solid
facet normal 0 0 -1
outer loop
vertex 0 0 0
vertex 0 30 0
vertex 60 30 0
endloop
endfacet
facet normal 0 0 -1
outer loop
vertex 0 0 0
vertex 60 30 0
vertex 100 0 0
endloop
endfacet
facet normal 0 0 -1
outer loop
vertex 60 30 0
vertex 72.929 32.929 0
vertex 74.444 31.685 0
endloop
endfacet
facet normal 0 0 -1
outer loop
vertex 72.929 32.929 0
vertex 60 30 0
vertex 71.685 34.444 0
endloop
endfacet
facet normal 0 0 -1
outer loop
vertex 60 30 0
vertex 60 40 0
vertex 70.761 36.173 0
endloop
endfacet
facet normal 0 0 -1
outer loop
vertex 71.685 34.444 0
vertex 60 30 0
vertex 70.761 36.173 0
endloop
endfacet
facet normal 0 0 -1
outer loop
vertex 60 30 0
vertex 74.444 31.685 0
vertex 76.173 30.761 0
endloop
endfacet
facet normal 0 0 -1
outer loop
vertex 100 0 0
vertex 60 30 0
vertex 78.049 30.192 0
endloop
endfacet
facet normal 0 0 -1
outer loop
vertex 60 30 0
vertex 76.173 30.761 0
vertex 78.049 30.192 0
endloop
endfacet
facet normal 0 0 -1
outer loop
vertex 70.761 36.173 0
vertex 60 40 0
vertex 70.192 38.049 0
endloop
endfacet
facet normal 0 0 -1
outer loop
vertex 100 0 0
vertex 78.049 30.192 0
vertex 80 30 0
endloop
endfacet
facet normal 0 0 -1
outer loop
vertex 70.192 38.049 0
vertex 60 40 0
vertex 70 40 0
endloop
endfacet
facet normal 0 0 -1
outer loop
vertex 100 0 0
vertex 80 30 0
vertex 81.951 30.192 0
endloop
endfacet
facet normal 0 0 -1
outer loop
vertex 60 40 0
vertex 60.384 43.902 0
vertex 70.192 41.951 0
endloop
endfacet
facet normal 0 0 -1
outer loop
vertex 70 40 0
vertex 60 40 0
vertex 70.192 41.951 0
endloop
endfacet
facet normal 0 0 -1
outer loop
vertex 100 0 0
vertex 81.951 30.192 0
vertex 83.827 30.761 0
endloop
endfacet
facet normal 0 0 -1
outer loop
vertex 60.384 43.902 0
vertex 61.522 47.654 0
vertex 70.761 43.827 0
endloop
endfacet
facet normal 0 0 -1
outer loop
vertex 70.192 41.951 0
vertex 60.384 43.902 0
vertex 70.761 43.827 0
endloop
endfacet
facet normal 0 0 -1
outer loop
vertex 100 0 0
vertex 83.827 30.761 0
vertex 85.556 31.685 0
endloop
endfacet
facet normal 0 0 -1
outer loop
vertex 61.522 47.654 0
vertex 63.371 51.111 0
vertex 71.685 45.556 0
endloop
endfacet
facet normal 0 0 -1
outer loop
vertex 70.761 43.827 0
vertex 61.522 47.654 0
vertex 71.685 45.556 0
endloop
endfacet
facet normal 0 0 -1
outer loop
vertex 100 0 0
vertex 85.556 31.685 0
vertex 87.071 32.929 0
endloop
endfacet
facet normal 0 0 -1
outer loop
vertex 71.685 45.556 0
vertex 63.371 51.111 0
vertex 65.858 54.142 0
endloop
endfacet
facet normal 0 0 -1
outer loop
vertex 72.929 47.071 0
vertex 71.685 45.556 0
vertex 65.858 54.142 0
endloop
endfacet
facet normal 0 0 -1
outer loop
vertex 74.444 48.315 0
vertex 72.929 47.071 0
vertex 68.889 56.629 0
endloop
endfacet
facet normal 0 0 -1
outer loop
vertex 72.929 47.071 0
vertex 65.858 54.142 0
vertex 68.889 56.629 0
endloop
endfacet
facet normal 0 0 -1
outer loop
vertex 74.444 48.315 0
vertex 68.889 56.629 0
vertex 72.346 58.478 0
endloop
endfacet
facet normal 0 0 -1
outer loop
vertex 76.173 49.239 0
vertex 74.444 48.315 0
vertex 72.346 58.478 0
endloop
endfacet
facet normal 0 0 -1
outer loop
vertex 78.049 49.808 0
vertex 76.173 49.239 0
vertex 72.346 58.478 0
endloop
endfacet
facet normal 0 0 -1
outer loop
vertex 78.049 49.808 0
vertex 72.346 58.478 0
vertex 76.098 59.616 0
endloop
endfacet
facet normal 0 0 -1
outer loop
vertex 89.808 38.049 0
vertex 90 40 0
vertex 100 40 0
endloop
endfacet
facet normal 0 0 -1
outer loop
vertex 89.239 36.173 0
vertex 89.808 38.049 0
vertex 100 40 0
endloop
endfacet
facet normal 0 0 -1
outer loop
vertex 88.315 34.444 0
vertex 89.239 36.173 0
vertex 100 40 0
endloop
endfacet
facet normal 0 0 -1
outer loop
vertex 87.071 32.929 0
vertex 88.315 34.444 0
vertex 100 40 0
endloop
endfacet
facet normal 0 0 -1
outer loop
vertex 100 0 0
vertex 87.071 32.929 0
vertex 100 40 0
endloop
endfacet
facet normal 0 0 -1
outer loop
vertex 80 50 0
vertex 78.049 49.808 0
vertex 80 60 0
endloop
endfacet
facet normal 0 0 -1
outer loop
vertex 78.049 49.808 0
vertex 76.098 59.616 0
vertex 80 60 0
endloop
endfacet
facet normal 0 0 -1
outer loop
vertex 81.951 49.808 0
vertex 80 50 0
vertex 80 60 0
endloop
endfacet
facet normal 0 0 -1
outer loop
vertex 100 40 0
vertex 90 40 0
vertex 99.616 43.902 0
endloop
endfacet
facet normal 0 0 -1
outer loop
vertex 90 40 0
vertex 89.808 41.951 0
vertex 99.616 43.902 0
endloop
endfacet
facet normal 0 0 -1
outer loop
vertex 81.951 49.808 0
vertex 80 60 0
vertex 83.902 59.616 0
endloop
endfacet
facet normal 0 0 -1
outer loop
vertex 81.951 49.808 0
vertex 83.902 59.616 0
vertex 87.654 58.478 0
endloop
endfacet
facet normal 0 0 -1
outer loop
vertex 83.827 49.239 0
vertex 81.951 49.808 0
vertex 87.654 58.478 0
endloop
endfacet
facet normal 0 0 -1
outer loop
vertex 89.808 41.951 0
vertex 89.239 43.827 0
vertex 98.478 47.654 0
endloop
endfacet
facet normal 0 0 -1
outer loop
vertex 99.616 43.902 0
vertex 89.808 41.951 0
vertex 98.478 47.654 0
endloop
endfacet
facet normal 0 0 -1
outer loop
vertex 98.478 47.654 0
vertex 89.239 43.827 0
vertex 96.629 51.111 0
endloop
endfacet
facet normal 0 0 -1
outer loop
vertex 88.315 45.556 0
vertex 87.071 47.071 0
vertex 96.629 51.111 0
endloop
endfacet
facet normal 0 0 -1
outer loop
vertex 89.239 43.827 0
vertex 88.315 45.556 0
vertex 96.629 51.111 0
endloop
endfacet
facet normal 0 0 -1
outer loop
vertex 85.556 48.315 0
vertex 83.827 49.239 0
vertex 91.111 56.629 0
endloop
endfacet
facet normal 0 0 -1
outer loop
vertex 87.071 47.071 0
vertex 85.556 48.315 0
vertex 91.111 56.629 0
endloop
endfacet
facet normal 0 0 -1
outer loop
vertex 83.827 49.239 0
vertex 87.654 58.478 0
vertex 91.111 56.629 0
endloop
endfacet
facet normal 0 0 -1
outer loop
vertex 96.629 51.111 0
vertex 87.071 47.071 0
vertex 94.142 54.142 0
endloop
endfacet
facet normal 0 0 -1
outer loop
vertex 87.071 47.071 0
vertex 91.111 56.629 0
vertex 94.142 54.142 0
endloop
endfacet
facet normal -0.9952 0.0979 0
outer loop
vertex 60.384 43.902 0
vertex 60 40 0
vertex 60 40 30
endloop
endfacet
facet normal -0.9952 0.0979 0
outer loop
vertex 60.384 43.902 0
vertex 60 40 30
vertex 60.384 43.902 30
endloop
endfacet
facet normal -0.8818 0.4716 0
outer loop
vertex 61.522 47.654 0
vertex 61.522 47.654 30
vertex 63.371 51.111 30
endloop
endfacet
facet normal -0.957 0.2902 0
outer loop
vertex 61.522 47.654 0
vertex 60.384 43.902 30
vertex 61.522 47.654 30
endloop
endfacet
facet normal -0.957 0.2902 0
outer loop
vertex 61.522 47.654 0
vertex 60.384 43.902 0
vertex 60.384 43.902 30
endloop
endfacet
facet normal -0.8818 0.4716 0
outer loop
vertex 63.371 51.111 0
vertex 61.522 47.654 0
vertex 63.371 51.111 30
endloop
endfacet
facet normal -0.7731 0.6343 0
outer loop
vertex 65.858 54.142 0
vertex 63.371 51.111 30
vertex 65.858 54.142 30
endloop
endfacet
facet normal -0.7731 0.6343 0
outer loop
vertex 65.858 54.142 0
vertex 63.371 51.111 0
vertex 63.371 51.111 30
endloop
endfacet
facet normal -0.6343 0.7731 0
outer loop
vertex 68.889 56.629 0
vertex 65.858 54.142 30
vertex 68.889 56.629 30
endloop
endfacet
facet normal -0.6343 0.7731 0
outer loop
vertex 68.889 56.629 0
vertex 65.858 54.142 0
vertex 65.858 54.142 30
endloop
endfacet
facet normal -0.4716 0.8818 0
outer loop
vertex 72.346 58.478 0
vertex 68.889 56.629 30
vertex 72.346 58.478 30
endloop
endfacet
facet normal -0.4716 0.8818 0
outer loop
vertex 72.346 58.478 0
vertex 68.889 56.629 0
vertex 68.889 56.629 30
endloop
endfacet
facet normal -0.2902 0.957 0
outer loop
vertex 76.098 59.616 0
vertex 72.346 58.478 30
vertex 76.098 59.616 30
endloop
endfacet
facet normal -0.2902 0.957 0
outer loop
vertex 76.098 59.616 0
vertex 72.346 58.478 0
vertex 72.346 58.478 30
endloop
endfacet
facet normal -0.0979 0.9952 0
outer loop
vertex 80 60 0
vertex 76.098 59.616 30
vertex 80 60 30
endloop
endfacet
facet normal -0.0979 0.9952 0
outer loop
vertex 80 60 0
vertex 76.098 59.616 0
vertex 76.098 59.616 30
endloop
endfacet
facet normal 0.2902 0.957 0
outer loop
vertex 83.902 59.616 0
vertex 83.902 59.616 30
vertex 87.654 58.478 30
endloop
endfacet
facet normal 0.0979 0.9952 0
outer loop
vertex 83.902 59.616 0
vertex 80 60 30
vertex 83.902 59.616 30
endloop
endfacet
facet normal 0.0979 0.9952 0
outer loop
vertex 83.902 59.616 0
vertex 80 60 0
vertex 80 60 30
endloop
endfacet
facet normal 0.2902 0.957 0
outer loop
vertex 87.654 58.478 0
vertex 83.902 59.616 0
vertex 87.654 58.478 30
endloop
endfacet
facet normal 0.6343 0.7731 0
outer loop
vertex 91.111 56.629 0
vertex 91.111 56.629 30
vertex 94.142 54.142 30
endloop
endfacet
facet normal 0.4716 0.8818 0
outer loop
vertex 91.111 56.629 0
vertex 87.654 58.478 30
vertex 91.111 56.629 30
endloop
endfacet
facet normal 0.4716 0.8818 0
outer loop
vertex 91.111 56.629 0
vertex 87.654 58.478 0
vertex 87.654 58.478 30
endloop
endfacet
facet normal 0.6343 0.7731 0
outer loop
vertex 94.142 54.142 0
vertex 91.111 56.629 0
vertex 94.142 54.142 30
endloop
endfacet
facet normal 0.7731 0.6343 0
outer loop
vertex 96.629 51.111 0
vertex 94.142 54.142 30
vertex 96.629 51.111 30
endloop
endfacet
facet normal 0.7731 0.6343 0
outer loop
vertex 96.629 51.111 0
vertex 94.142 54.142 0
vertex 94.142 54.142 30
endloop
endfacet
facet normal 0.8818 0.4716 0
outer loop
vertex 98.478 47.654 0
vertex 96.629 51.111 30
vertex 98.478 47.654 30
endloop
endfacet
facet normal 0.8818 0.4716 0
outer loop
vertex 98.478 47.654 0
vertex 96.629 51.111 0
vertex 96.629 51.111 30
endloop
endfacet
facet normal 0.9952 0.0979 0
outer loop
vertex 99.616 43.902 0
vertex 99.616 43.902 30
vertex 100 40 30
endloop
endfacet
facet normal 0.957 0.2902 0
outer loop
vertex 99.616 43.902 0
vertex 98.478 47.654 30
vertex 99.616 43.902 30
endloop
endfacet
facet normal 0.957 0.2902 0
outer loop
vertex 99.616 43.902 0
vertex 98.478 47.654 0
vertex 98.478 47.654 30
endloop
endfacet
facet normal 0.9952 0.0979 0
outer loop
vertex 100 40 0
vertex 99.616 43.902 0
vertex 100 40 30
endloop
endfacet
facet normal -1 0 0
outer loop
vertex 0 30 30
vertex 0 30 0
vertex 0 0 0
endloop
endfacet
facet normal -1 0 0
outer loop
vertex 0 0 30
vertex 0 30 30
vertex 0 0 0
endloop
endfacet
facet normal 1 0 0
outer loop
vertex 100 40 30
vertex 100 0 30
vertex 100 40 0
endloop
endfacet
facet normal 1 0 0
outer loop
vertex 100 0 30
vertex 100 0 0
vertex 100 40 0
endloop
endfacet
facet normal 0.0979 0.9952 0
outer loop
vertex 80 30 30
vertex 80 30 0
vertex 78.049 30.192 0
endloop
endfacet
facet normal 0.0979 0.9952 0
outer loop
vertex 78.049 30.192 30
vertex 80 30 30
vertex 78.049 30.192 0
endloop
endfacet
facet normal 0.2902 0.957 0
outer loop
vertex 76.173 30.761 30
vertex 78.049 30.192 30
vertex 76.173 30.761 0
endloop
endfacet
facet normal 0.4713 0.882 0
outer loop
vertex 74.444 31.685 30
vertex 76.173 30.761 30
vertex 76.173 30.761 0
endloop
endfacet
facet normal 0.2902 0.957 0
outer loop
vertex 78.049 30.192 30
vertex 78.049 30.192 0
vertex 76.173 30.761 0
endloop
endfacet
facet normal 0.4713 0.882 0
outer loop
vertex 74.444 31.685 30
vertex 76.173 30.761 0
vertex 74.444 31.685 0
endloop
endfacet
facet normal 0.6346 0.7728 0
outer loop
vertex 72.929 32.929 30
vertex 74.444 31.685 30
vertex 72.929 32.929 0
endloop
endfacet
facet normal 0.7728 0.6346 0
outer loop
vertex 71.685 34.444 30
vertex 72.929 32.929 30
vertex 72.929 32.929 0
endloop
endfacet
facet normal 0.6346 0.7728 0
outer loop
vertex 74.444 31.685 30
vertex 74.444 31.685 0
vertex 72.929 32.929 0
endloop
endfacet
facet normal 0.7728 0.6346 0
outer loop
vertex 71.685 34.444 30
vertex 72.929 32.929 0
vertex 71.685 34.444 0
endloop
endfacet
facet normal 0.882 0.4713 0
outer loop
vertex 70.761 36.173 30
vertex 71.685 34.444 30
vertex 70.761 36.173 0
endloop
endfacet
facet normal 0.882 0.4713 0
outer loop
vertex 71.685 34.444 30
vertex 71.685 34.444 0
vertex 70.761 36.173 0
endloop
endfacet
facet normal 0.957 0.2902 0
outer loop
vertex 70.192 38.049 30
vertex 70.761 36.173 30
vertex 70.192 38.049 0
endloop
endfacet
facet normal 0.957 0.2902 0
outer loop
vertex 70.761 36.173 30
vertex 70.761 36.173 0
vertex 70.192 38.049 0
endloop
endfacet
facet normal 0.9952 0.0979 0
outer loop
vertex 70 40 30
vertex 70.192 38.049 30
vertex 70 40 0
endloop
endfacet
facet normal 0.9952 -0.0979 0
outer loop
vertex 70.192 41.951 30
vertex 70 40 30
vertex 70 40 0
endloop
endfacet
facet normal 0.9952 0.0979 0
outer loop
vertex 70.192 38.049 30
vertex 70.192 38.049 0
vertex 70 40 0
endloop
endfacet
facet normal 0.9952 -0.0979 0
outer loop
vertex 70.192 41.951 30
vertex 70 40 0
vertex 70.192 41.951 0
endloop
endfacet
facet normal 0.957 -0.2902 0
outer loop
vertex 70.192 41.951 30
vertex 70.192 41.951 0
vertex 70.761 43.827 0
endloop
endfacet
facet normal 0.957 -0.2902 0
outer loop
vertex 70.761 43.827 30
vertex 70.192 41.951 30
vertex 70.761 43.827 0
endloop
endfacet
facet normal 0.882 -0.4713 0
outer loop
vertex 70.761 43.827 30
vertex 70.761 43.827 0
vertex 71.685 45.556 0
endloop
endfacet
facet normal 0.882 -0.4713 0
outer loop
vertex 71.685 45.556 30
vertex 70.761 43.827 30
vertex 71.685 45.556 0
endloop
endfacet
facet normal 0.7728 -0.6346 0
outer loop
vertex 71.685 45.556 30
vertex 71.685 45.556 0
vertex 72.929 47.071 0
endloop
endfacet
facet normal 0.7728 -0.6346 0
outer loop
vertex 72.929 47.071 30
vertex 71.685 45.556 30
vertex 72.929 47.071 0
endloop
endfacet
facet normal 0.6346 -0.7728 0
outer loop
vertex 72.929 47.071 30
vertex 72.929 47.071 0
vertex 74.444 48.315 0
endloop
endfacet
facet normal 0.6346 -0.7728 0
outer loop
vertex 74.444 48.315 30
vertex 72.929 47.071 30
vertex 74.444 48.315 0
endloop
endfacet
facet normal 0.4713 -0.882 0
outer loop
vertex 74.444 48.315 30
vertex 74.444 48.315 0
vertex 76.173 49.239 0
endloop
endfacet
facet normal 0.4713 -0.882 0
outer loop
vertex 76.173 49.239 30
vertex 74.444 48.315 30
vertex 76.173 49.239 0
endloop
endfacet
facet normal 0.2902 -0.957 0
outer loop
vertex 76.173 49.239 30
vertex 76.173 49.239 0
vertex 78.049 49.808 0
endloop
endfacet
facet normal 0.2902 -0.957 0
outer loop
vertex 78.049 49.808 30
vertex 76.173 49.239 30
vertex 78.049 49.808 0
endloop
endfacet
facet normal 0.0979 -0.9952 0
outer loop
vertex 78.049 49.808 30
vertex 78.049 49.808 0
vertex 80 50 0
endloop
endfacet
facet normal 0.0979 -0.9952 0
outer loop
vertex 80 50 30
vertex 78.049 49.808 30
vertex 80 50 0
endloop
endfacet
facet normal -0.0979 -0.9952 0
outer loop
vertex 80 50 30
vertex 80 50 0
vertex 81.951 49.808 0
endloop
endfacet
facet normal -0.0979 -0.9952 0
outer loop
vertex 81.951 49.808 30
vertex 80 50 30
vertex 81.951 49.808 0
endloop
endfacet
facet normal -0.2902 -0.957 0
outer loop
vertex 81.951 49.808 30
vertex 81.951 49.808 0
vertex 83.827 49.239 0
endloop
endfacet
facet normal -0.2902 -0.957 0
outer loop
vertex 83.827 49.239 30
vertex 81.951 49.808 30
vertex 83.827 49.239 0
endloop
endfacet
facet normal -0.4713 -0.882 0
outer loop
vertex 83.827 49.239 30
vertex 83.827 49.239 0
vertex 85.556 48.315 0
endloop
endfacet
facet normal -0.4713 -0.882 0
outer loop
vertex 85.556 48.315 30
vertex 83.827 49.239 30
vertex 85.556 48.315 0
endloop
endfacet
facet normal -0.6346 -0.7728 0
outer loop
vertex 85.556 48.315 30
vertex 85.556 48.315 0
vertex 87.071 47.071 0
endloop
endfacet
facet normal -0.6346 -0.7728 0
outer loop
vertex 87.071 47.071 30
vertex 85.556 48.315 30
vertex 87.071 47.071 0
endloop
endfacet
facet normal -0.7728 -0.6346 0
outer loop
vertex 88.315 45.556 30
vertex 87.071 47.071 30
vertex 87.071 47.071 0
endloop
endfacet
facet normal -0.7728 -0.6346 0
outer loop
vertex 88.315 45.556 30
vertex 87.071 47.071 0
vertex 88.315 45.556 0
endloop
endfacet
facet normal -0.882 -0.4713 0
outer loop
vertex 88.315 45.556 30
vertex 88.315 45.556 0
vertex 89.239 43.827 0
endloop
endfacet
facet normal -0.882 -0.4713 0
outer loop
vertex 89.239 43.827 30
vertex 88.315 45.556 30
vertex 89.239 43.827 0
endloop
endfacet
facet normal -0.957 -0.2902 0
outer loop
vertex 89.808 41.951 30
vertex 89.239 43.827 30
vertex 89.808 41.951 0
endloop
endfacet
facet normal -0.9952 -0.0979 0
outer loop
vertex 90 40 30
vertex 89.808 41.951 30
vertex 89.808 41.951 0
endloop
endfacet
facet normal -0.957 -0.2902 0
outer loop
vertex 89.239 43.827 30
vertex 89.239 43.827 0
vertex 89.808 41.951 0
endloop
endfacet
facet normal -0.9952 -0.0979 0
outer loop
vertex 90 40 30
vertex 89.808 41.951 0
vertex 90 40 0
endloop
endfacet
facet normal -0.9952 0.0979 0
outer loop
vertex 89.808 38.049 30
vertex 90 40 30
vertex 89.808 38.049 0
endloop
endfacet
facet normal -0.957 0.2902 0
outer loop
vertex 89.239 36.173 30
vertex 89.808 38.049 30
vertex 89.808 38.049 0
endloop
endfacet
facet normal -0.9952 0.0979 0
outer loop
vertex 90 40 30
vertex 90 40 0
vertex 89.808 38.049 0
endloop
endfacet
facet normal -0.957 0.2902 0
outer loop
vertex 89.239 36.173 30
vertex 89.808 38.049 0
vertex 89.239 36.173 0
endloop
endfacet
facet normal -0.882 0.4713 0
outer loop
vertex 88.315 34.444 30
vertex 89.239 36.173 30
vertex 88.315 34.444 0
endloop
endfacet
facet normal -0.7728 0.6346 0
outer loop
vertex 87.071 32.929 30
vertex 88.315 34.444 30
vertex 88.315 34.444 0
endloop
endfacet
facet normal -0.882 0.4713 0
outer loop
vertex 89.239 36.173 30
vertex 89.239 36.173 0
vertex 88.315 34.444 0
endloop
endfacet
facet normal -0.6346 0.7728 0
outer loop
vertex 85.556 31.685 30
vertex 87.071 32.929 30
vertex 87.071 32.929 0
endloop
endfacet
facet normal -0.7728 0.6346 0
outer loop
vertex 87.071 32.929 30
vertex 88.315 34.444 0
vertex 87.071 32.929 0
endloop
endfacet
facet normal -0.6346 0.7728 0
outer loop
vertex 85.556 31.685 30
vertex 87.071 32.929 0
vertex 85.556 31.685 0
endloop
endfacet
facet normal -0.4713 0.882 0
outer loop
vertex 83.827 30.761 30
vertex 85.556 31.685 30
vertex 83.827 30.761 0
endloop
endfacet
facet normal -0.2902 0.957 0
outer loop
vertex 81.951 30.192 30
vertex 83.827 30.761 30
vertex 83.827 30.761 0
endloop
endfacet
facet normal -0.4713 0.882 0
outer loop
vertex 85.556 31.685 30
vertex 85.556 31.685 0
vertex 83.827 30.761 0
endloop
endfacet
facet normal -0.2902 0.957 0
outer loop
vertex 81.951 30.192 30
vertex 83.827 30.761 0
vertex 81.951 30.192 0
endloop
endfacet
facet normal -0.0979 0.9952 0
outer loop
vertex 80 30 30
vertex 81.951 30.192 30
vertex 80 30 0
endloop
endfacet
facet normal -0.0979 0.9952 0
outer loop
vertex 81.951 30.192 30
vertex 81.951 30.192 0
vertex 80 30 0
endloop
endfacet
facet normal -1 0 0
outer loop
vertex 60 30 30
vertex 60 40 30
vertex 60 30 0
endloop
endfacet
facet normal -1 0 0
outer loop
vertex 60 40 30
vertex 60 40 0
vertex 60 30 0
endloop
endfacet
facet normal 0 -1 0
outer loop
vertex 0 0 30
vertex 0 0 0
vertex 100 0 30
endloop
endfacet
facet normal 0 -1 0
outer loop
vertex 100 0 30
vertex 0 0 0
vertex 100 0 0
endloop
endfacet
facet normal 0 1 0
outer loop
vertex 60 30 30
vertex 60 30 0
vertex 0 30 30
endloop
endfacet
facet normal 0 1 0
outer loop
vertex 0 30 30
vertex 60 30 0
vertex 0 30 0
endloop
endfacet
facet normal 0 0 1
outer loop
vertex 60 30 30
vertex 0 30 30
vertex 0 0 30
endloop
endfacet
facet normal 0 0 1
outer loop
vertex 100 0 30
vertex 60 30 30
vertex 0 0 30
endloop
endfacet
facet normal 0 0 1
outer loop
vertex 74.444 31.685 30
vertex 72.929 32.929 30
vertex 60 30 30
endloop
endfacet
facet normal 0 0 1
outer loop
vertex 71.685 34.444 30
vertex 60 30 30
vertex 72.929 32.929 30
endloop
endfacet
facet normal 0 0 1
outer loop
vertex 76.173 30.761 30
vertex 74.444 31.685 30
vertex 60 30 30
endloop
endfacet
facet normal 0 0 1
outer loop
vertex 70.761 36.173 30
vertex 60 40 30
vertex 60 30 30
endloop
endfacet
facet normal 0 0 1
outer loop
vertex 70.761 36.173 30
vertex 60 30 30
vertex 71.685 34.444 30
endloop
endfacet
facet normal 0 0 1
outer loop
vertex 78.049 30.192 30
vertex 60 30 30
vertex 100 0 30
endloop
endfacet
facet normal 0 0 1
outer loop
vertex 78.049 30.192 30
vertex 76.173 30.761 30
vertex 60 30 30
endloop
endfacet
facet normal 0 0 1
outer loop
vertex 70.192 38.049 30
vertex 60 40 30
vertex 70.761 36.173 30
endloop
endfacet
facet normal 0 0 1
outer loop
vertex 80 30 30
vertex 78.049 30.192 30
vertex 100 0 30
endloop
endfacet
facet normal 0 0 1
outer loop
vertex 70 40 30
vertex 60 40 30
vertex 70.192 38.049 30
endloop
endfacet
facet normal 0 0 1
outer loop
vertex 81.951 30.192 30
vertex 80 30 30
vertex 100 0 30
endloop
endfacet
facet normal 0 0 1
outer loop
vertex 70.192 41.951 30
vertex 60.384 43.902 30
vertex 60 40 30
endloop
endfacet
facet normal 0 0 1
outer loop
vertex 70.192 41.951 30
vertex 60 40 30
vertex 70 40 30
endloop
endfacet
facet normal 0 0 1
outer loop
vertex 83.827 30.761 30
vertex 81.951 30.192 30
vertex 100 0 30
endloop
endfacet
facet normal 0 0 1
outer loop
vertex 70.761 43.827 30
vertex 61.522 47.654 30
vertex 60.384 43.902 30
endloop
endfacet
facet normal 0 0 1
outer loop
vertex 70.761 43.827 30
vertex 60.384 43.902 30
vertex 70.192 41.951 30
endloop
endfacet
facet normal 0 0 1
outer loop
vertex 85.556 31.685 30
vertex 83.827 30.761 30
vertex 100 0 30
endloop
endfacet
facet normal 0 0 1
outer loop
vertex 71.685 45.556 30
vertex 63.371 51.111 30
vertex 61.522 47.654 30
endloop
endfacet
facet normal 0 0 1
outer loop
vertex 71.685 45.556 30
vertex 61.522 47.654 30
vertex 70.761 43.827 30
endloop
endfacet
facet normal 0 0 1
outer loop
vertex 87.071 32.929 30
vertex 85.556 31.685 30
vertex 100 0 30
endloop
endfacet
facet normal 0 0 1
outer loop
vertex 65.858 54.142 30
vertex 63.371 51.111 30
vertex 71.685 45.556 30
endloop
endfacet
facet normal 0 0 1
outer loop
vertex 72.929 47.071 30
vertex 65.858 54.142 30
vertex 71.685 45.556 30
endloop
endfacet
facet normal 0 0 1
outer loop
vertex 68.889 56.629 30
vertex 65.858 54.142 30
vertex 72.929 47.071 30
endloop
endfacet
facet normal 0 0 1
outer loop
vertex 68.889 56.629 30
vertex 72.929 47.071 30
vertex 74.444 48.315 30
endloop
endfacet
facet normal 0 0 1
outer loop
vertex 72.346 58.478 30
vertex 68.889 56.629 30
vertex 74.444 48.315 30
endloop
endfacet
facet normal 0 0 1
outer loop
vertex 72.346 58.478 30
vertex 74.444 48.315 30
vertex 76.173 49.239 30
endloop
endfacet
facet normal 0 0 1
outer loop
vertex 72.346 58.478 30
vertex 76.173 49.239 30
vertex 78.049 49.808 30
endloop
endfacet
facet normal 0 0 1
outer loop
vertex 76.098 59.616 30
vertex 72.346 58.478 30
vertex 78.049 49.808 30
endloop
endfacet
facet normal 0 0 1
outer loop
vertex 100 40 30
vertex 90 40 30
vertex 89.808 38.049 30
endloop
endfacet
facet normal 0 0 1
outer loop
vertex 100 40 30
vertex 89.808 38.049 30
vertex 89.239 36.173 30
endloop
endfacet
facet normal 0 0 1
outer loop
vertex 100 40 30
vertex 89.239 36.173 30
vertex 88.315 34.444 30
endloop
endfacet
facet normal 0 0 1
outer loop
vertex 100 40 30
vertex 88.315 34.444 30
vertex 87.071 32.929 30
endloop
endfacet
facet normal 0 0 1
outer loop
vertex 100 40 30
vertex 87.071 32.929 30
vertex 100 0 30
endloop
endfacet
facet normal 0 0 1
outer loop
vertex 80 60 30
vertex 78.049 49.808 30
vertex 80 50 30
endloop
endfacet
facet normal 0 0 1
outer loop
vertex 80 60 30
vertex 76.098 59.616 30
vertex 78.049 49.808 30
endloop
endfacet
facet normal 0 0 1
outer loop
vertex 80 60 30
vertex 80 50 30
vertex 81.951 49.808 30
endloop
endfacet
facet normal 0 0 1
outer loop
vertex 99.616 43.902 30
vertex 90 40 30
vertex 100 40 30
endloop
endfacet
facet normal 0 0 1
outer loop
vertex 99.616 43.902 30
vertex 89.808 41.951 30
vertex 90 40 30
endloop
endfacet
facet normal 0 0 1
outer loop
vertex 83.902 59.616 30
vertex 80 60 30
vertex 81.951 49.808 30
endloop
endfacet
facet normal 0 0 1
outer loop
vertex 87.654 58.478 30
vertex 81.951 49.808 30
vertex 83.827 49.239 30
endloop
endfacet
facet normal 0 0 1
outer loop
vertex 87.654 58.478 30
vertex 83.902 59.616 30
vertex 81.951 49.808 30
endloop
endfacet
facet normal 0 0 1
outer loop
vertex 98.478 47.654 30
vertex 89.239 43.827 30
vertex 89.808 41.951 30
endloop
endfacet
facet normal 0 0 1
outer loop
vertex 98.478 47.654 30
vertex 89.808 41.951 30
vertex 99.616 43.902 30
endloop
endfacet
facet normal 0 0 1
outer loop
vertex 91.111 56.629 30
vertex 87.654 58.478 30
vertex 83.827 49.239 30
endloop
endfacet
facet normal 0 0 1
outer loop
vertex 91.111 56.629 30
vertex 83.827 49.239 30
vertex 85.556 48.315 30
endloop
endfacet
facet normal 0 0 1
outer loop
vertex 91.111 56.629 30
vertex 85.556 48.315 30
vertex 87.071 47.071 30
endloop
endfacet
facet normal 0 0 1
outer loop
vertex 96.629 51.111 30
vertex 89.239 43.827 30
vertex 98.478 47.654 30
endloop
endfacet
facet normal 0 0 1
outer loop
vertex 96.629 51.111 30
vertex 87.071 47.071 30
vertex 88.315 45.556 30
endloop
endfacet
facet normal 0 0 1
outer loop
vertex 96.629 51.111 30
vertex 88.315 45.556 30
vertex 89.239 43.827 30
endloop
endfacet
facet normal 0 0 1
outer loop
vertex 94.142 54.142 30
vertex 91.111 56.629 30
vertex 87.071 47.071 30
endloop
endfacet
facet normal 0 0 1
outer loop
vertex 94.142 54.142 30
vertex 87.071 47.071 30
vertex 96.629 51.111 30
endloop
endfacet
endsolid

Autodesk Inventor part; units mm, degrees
ref_plane "YZ Plane" through (0, 0, 0) normal (1, 0, 0) x (0, 1, 0)
ref_plane "XZ Plane" through (0, 0, 0) normal (0, 1, 0) x (-1, 0, 0)
ref_plane "XY Plane" through (0, 0, 0) normal (0, 0, 1) x (1, 0, 0)
sketch "Esboço1" plane through (0, 0, 0) normal (0, 0, 1) x (1, 0, 0)
  line L0 (0, 0) -> (100, 0)
  line L1 (100, 0) -> (100, 40)
  line L2 (60, 40) -> (60, 30)
  line L3 (60, 30) -> (0, 30)
  line L4 (0, 30) -> (0, 0)
  arc A0 (100, 40) -> (60, 40) centre (80, 40) ccw
  dimension "d0" = 100
  dimension "d3" = 40
  dimension "d4" = 30
  dimension "d5" = 20
extrude "Extrusão1" add sketch "Esboço1" along normal blind 30
sketch "Esboço2" plane through (0, 0, 30) normal (0, 0, 1) x (1, 0, 0)
  arc A0 (100, 40) -> (60, 40) centre (80, 40) ccw projected
  point P0 (0, 0)
hole "Furo1" at (80, 40, 30) direction (0, 0, -1) diameter 20 end through all
